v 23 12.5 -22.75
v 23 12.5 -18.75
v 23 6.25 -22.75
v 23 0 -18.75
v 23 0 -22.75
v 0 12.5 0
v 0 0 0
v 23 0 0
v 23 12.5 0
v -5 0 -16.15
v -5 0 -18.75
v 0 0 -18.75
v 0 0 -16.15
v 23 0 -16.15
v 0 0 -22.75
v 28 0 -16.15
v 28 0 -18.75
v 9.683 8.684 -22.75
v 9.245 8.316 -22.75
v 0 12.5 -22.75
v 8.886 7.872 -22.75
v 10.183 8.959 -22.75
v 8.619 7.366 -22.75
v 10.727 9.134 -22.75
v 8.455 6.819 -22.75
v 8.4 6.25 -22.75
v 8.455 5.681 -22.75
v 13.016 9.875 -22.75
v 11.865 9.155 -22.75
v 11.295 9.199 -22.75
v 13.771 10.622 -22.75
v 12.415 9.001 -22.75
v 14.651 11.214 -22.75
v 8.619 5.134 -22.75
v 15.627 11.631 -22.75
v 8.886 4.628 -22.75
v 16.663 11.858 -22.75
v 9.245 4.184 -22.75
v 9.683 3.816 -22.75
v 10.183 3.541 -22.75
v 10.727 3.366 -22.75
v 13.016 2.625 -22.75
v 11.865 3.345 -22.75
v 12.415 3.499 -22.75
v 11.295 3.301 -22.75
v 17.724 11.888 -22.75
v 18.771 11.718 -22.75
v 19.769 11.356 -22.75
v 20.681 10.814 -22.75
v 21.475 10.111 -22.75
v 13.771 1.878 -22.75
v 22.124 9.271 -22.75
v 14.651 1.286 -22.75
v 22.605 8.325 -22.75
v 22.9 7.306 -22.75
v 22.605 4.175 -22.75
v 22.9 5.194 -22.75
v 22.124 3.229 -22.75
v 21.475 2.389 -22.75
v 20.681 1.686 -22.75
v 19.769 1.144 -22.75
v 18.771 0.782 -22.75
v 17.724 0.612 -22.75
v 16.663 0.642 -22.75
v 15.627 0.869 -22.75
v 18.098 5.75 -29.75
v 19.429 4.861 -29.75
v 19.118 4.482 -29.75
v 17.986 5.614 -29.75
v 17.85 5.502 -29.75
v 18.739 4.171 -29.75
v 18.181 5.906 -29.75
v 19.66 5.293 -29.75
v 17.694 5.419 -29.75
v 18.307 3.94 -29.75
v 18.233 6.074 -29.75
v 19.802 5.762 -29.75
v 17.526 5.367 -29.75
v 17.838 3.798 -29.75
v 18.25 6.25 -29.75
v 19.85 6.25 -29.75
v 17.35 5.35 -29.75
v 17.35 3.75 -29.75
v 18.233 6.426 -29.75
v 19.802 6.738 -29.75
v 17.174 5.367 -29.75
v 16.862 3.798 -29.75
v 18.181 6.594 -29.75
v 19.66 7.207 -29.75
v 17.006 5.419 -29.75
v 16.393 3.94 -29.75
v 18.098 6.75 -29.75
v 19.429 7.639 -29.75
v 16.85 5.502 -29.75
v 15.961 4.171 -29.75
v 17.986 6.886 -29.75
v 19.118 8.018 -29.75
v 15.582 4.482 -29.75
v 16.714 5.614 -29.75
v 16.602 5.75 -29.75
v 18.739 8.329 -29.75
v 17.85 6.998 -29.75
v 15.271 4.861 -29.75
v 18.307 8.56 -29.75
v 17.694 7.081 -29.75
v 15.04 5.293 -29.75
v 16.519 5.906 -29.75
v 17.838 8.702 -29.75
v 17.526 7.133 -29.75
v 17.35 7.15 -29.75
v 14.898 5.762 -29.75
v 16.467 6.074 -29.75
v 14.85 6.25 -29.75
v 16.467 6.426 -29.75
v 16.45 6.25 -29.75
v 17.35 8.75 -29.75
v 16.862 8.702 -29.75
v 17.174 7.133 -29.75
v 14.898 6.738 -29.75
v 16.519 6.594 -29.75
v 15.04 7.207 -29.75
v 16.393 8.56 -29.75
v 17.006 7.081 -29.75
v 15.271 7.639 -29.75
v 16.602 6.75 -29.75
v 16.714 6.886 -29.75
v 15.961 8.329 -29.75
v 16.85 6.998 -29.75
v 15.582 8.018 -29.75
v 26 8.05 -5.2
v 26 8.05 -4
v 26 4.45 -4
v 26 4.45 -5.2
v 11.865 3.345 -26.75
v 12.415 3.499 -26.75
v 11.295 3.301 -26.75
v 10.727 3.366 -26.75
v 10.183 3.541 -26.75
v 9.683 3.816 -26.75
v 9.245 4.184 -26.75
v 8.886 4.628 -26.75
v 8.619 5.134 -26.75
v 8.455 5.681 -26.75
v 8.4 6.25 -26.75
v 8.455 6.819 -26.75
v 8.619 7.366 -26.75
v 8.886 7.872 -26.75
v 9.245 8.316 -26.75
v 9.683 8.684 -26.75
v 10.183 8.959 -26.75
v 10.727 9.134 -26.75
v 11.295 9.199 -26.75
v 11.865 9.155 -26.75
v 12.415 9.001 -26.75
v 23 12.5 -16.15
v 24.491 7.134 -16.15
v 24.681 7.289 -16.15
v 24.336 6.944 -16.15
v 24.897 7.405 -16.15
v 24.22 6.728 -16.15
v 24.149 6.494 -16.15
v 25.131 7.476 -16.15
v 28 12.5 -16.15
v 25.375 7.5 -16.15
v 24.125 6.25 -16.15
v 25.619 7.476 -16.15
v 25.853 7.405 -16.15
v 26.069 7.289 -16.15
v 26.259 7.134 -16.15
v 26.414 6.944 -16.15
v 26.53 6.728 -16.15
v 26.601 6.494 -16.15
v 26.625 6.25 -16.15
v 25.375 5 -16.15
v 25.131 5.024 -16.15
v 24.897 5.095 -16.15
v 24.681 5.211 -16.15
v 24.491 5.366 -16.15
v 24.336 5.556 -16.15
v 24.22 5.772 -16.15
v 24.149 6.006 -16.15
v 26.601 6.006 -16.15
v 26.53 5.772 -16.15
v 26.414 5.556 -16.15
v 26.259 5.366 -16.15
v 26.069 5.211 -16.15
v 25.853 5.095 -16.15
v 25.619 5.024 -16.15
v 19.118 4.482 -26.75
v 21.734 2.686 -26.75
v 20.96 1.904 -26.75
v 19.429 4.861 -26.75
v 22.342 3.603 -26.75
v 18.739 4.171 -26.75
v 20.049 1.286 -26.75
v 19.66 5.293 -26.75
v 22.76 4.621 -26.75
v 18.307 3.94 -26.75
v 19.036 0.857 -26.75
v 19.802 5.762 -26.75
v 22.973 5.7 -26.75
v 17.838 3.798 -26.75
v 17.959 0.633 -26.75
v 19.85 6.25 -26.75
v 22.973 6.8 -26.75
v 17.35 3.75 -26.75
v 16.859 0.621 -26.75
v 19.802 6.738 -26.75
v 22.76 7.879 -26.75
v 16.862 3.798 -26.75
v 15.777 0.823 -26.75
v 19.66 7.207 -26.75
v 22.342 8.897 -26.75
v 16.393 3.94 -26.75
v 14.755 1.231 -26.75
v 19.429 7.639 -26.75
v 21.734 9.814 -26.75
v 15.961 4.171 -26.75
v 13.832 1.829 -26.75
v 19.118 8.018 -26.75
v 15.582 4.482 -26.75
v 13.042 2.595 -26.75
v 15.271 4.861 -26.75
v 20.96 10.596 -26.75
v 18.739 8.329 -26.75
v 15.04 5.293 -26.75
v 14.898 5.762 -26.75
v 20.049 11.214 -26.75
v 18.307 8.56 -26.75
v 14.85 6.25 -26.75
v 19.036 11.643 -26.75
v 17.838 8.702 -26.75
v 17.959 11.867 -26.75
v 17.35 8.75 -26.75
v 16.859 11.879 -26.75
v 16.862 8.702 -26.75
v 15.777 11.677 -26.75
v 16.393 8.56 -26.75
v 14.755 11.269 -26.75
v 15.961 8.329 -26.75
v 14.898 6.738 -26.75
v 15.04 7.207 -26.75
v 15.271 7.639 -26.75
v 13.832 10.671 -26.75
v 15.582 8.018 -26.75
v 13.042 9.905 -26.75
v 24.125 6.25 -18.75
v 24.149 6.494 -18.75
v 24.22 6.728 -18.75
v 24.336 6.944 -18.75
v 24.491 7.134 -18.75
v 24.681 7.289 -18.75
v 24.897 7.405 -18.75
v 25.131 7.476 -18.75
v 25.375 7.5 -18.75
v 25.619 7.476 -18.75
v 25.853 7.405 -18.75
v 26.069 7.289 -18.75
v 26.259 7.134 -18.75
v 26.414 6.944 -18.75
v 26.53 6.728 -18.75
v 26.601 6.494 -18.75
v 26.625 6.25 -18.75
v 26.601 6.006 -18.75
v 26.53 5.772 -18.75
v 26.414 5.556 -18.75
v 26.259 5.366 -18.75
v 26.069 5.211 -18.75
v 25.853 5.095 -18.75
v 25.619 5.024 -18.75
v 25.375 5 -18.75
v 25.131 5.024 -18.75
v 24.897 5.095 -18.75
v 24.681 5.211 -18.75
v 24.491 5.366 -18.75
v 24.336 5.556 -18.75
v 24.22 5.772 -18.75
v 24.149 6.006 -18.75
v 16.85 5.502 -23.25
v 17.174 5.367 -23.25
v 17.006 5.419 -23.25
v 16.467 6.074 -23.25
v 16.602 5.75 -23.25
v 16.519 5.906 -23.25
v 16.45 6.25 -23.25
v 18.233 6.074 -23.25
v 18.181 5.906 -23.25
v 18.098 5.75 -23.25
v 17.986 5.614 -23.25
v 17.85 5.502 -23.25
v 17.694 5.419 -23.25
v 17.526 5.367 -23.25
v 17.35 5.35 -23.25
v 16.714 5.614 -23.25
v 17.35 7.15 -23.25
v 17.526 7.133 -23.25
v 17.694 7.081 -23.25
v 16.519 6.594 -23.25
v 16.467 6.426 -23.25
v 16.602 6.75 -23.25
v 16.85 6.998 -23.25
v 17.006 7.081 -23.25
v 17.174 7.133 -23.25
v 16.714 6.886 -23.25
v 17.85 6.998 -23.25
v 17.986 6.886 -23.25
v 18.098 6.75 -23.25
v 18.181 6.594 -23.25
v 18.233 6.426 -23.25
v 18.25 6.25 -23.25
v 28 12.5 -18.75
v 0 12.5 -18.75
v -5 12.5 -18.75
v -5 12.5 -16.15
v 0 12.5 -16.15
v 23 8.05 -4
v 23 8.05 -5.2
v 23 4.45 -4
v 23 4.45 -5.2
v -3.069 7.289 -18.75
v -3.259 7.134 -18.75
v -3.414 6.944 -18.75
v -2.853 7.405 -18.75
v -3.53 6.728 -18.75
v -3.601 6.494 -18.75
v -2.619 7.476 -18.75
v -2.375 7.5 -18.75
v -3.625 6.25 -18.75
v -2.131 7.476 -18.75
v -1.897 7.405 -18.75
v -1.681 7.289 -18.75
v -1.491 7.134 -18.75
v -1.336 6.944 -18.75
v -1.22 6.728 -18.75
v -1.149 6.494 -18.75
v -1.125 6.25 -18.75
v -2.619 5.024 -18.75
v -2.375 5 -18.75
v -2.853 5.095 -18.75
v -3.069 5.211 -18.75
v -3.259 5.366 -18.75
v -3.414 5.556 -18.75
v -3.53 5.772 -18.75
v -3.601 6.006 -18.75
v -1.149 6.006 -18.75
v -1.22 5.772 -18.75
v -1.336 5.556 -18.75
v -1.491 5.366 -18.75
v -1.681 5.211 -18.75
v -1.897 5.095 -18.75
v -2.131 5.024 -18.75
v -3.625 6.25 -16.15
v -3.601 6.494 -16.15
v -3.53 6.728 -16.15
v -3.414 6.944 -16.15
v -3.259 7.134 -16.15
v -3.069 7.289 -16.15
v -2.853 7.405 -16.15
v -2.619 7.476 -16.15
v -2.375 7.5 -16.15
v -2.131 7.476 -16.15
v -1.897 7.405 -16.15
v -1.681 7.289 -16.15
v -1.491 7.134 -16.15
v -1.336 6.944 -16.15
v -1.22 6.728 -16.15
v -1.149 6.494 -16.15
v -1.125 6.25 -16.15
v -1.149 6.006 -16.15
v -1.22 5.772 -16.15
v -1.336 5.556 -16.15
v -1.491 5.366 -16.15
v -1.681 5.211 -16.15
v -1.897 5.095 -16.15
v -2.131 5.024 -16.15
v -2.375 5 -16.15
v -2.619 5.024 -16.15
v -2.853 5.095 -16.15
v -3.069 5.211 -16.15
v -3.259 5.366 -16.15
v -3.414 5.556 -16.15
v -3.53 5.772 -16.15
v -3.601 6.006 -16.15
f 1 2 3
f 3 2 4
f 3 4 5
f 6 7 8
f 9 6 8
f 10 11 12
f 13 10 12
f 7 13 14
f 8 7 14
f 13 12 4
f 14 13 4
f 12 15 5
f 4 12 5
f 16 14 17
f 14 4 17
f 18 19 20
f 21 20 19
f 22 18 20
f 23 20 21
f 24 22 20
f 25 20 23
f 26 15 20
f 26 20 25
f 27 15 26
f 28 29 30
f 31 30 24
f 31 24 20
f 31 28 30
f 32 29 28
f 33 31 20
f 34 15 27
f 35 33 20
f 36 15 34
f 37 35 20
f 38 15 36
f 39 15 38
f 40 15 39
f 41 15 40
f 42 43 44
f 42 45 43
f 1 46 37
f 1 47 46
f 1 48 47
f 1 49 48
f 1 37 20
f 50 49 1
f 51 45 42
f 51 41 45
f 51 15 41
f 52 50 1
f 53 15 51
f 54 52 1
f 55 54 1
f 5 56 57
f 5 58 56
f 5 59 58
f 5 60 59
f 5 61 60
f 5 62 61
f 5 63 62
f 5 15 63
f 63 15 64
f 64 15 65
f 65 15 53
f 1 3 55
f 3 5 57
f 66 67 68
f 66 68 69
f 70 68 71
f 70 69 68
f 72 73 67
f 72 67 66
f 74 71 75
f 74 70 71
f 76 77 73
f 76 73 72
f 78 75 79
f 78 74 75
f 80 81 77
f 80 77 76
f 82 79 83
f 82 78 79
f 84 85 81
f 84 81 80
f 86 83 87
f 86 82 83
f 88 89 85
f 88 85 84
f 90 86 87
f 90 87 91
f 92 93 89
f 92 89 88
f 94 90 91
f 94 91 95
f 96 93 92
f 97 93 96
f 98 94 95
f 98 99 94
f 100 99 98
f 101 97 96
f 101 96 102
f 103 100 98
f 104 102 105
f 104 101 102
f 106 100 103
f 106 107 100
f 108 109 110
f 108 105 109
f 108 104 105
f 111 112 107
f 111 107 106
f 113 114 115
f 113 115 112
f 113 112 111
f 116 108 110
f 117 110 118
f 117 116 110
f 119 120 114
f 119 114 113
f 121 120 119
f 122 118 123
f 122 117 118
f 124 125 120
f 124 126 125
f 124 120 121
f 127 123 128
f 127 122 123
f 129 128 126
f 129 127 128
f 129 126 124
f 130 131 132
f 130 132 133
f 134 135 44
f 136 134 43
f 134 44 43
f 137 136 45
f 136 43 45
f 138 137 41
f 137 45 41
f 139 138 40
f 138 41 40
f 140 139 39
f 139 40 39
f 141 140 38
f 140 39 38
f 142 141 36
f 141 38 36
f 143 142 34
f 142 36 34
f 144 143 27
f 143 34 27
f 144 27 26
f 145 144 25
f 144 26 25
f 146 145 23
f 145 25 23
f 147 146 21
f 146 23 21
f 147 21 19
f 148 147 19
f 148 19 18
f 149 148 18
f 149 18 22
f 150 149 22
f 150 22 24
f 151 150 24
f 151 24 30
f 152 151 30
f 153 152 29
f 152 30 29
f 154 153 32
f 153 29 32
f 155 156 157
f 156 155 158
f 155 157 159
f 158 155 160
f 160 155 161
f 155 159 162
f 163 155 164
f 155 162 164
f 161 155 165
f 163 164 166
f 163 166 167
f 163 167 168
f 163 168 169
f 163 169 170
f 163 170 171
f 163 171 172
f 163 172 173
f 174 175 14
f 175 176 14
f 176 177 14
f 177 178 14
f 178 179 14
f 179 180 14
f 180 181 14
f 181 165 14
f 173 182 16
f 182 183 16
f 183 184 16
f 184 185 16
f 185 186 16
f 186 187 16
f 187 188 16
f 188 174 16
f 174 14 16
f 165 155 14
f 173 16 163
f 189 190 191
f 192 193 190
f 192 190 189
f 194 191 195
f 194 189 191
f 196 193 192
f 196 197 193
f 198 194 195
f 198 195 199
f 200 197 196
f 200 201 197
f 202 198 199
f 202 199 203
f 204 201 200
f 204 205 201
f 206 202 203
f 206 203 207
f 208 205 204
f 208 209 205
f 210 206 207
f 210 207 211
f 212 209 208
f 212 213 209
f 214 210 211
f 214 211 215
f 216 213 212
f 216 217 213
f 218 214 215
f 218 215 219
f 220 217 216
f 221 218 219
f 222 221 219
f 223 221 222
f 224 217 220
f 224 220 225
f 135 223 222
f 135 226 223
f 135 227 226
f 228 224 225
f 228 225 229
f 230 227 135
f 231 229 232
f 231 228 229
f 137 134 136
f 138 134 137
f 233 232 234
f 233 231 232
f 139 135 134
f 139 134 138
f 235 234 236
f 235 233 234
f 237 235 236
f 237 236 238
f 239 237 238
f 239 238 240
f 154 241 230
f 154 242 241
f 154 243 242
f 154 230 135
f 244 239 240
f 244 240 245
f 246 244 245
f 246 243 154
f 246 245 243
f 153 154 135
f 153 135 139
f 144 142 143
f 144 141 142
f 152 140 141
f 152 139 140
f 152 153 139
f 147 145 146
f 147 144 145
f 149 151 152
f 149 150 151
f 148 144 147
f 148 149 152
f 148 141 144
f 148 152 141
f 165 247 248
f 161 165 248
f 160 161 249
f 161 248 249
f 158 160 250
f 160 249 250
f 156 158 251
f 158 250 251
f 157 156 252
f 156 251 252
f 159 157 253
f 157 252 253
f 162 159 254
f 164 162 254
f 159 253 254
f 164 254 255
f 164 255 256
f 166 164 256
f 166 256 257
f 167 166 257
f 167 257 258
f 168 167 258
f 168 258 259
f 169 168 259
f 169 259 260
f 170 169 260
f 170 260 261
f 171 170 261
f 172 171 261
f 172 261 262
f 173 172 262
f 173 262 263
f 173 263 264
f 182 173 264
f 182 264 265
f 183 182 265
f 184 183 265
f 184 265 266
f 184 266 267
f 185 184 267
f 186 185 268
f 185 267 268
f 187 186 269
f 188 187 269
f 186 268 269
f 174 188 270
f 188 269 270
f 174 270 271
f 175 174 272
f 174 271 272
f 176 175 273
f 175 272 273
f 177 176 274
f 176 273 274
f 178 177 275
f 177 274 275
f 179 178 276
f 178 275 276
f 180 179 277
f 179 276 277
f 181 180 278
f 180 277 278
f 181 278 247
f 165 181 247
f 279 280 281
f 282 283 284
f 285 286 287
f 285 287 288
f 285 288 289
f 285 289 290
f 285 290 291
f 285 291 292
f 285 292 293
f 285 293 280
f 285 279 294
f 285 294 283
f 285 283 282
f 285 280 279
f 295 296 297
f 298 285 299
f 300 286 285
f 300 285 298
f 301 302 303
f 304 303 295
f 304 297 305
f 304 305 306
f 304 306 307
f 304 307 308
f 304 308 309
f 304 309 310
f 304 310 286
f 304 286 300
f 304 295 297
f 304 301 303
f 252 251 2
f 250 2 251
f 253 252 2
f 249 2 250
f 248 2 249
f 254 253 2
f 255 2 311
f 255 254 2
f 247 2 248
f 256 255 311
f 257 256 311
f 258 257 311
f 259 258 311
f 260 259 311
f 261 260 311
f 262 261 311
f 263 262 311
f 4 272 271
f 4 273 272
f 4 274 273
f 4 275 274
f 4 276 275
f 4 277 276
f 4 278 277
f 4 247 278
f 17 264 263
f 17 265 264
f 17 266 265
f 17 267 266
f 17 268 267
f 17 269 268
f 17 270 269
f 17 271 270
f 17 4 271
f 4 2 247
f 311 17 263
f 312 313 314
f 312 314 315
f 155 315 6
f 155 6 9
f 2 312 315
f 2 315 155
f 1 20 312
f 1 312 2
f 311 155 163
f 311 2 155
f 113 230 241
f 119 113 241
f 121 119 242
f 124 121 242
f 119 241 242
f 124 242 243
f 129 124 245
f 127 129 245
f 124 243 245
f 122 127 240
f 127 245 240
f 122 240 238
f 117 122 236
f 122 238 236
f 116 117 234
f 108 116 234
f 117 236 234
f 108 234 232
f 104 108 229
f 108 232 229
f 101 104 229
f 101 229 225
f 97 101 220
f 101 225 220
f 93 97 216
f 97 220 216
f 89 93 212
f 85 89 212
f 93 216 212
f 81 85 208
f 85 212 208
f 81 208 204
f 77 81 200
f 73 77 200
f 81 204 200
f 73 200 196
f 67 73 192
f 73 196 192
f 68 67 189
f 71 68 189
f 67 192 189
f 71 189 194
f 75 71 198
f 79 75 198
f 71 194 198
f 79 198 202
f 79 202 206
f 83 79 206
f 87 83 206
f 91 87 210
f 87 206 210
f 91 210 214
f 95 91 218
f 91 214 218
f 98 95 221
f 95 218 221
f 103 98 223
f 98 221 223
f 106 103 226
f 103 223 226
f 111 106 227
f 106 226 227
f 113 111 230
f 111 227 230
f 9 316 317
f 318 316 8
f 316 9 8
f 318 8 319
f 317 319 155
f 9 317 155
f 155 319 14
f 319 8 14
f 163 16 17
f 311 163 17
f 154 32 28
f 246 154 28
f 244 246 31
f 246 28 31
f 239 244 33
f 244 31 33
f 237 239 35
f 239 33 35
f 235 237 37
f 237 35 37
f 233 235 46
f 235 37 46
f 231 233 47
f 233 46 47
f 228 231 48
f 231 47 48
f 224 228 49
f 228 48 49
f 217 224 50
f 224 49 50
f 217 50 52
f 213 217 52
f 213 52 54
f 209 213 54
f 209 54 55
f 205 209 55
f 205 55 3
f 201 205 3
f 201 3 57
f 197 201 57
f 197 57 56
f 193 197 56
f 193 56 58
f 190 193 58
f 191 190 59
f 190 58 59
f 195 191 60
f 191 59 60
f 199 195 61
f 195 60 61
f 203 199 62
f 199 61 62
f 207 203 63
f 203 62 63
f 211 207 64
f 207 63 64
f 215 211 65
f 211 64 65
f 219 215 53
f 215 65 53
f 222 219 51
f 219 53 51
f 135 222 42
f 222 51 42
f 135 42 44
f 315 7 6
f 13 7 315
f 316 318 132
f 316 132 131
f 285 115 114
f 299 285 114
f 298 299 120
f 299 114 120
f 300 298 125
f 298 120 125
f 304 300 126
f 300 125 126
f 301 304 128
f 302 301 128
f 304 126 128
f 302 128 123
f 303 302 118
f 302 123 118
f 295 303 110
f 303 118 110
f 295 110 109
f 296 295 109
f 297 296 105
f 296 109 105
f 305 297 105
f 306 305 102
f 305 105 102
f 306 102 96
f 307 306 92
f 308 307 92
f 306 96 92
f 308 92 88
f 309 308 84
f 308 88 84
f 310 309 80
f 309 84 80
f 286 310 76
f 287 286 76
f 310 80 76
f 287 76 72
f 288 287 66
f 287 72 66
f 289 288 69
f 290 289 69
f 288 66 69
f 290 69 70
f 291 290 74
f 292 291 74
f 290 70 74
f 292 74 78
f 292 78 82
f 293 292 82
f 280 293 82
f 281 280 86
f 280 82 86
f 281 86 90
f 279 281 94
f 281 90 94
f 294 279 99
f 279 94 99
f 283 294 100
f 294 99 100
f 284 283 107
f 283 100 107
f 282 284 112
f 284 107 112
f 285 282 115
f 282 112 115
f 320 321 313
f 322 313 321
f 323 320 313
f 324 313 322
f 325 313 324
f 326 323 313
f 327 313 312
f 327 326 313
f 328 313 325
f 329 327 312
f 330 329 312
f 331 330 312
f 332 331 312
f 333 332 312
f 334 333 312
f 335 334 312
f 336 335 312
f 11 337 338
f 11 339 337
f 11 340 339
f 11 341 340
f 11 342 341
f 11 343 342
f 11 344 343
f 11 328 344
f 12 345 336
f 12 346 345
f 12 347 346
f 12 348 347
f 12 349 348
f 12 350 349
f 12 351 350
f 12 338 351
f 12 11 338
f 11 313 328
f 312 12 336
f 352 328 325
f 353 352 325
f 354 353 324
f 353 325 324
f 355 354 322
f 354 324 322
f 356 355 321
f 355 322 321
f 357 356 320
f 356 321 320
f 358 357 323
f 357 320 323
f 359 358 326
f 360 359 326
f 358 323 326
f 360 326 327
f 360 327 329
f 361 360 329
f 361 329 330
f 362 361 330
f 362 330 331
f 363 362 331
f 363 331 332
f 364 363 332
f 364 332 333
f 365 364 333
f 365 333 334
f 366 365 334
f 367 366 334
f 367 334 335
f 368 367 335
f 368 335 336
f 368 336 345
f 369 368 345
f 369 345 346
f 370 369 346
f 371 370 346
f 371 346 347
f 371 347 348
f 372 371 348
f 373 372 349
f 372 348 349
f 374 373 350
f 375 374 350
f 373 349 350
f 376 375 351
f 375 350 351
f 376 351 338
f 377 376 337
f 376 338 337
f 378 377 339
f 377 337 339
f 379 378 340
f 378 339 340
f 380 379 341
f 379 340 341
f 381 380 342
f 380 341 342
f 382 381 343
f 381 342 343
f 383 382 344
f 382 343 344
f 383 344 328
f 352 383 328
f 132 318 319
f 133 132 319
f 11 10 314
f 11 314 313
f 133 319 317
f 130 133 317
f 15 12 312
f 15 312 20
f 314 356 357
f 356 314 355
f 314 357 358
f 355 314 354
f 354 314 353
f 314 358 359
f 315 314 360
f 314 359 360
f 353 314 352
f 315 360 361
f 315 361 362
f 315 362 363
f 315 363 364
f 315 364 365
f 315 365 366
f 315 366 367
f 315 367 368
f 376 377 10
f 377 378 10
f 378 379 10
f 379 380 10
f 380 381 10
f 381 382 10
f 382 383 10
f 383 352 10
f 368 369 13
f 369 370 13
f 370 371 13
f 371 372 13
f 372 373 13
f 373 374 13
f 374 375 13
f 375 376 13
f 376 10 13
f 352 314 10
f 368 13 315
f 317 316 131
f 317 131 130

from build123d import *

# Parameters (mm, degrees)
SKETCH_1_W          = 5
SKETCH_1_H          = 2.6
SKETCH_1_W_2        = 23
SKETCH_1_H_2        = 22.75
EXTRUDE_1_DEPTH     = 12.5
SKETCH_2_R          = 5.65
EXTRUDE_2_DEPTH     = 4
SKETCH_3_R          = 2.5
EXTRUDE_3_DEPTH     = 3
SKETCH_4_R          = 0.9
CUT_EXTRUDE_1_DEPTH = 6.5
SKETCH_5_R          = 2.95
EXTRUDE_4_DEPTH     = 4
CUT_EXTRUDE_2_REACH = 20.75
SKETCH_6_R          = 1.25
SKETCH_7_W          = 1.2
SKETCH_7_H          = 3.6
EXTRUDE_5_DEPTH     = 3


with BuildPart() as part:
    # Эскиз1 → Бобышка-Вытянуть1 (new body)
    with BuildSketch(Plane(origin=(0, 0, 0), x_dir=(1, 0, 0), z_dir=(0, 1, 0))):
        with Locations((-2.5, 17.45)):
            Rectangle(SKETCH_1_W, SKETCH_1_H)
        with Locations((11.5, 11.375)):
            Rectangle(SKETCH_1_W_2, SKETCH_1_H_2)
        with Locations((25.5, 17.45)):
            Rectangle(SKETCH_1_W, SKETCH_1_H)
    extrude(amount=EXTRUDE_1_DEPTH)

    # Эскиз2 → Бобышка-Вытянуть2 (add)
    with BuildSketch(Plane(origin=(0, 0, -22.75), x_dir=(-1, 0, 0), z_dir=(0, 0, -1))):
        with Locations((-17.35, 6.25)):
            Circle(SKETCH_2_R)
    extrude(amount=EXTRUDE_2_DEPTH)

    # Эскиз3 → Бобышка-Вытянуть3 (add)
    with BuildSketch(Plane(origin=(0, 0, -26.75), x_dir=(-1, 0, 0), z_dir=(0, 0, -1))):
        with Locations((-17.35, 6.25)):
            Circle(SKETCH_3_R)
    extrude(amount=EXTRUDE_3_DEPTH)

    # Эскиз4 → Вырез-Вытянуть1 (cut)
    with BuildSketch(Plane(origin=(0, 0, -29.75), x_dir=(-1, 0, 0), z_dir=(0, 0, -1))):
        with Locations((-17.35, 6.25)):
            Circle(SKETCH_4_R)
    extrude(amount=-CUT_EXTRUDE_1_DEPTH, mode=Mode.SUBTRACT)

    # Эскиз5 → Бобышка-Вытянуть4 (add)
    with BuildSketch(Plane(origin=(0, 0, -22.75), x_dir=(-1, 0, 0), z_dir=(0, 0, -1))):
        with Locations((-11.35, 6.25)):
            Circle(SKETCH_5_R)
    extrude(amount=EXTRUDE_4_DEPTH)

    # Эскиз6 → Вырез-Вытянуть2 (cut, up to next)
    with BuildSketch(Plane(origin=(0, 0, -18.75), x_dir=(-1, 0, 0), z_dir=(0, 0, -1)), mode=Mode.PRIVATE) as cut_extrude_2_sk1:
        with Locations((2.375, 6.25)):
            Circle(SKETCH_6_R)
    cut_extrude_2_tool1 = extrude(cut_extrude_2_sk1.sketch, amount=-CUT_EXTRUDE_2_REACH, mode=Mode.PRIVATE) & part.part
    add(cut_extrude_2_tool1.solids().sort_by_distance((-2.375, 6.25, -18.75))[0], mode=Mode.SUBTRACT)
    # Эскиз6 → Вырез-Вытянуть2 (cut, up to next)
    with BuildSketch(Plane(origin=(0, 0, -18.75), x_dir=(-1, 0, 0), z_dir=(0, 0, -1)), mode=Mode.PRIVATE) as cut_extrude_2_sk2:
        with Locations((-25.375, 6.25)):
            Circle(SKETCH_6_R)
    cut_extrude_2_tool2 = extrude(cut_extrude_2_sk2.sketch, amount=-CUT_EXTRUDE_2_REACH, mode=Mode.PRIVATE) & part.part
    add(cut_extrude_2_tool2.solids().sort_by_distance((25.375, 6.25, -18.75))[0], mode=Mode.SUBTRACT)

    # Эскиз7 → Бобышка-Вытянуть5 (add)
    with BuildSketch(Plane(origin=(23, 0, 0), x_dir=(0, 0, -1), z_dir=(1, 0, 0))):
        with Locations((4.6, 6.25)):
            Rectangle(SKETCH_7_W, SKETCH_7_H)
    extrude(amount=EXTRUDE_5_DEPTH)


solid = part.part
